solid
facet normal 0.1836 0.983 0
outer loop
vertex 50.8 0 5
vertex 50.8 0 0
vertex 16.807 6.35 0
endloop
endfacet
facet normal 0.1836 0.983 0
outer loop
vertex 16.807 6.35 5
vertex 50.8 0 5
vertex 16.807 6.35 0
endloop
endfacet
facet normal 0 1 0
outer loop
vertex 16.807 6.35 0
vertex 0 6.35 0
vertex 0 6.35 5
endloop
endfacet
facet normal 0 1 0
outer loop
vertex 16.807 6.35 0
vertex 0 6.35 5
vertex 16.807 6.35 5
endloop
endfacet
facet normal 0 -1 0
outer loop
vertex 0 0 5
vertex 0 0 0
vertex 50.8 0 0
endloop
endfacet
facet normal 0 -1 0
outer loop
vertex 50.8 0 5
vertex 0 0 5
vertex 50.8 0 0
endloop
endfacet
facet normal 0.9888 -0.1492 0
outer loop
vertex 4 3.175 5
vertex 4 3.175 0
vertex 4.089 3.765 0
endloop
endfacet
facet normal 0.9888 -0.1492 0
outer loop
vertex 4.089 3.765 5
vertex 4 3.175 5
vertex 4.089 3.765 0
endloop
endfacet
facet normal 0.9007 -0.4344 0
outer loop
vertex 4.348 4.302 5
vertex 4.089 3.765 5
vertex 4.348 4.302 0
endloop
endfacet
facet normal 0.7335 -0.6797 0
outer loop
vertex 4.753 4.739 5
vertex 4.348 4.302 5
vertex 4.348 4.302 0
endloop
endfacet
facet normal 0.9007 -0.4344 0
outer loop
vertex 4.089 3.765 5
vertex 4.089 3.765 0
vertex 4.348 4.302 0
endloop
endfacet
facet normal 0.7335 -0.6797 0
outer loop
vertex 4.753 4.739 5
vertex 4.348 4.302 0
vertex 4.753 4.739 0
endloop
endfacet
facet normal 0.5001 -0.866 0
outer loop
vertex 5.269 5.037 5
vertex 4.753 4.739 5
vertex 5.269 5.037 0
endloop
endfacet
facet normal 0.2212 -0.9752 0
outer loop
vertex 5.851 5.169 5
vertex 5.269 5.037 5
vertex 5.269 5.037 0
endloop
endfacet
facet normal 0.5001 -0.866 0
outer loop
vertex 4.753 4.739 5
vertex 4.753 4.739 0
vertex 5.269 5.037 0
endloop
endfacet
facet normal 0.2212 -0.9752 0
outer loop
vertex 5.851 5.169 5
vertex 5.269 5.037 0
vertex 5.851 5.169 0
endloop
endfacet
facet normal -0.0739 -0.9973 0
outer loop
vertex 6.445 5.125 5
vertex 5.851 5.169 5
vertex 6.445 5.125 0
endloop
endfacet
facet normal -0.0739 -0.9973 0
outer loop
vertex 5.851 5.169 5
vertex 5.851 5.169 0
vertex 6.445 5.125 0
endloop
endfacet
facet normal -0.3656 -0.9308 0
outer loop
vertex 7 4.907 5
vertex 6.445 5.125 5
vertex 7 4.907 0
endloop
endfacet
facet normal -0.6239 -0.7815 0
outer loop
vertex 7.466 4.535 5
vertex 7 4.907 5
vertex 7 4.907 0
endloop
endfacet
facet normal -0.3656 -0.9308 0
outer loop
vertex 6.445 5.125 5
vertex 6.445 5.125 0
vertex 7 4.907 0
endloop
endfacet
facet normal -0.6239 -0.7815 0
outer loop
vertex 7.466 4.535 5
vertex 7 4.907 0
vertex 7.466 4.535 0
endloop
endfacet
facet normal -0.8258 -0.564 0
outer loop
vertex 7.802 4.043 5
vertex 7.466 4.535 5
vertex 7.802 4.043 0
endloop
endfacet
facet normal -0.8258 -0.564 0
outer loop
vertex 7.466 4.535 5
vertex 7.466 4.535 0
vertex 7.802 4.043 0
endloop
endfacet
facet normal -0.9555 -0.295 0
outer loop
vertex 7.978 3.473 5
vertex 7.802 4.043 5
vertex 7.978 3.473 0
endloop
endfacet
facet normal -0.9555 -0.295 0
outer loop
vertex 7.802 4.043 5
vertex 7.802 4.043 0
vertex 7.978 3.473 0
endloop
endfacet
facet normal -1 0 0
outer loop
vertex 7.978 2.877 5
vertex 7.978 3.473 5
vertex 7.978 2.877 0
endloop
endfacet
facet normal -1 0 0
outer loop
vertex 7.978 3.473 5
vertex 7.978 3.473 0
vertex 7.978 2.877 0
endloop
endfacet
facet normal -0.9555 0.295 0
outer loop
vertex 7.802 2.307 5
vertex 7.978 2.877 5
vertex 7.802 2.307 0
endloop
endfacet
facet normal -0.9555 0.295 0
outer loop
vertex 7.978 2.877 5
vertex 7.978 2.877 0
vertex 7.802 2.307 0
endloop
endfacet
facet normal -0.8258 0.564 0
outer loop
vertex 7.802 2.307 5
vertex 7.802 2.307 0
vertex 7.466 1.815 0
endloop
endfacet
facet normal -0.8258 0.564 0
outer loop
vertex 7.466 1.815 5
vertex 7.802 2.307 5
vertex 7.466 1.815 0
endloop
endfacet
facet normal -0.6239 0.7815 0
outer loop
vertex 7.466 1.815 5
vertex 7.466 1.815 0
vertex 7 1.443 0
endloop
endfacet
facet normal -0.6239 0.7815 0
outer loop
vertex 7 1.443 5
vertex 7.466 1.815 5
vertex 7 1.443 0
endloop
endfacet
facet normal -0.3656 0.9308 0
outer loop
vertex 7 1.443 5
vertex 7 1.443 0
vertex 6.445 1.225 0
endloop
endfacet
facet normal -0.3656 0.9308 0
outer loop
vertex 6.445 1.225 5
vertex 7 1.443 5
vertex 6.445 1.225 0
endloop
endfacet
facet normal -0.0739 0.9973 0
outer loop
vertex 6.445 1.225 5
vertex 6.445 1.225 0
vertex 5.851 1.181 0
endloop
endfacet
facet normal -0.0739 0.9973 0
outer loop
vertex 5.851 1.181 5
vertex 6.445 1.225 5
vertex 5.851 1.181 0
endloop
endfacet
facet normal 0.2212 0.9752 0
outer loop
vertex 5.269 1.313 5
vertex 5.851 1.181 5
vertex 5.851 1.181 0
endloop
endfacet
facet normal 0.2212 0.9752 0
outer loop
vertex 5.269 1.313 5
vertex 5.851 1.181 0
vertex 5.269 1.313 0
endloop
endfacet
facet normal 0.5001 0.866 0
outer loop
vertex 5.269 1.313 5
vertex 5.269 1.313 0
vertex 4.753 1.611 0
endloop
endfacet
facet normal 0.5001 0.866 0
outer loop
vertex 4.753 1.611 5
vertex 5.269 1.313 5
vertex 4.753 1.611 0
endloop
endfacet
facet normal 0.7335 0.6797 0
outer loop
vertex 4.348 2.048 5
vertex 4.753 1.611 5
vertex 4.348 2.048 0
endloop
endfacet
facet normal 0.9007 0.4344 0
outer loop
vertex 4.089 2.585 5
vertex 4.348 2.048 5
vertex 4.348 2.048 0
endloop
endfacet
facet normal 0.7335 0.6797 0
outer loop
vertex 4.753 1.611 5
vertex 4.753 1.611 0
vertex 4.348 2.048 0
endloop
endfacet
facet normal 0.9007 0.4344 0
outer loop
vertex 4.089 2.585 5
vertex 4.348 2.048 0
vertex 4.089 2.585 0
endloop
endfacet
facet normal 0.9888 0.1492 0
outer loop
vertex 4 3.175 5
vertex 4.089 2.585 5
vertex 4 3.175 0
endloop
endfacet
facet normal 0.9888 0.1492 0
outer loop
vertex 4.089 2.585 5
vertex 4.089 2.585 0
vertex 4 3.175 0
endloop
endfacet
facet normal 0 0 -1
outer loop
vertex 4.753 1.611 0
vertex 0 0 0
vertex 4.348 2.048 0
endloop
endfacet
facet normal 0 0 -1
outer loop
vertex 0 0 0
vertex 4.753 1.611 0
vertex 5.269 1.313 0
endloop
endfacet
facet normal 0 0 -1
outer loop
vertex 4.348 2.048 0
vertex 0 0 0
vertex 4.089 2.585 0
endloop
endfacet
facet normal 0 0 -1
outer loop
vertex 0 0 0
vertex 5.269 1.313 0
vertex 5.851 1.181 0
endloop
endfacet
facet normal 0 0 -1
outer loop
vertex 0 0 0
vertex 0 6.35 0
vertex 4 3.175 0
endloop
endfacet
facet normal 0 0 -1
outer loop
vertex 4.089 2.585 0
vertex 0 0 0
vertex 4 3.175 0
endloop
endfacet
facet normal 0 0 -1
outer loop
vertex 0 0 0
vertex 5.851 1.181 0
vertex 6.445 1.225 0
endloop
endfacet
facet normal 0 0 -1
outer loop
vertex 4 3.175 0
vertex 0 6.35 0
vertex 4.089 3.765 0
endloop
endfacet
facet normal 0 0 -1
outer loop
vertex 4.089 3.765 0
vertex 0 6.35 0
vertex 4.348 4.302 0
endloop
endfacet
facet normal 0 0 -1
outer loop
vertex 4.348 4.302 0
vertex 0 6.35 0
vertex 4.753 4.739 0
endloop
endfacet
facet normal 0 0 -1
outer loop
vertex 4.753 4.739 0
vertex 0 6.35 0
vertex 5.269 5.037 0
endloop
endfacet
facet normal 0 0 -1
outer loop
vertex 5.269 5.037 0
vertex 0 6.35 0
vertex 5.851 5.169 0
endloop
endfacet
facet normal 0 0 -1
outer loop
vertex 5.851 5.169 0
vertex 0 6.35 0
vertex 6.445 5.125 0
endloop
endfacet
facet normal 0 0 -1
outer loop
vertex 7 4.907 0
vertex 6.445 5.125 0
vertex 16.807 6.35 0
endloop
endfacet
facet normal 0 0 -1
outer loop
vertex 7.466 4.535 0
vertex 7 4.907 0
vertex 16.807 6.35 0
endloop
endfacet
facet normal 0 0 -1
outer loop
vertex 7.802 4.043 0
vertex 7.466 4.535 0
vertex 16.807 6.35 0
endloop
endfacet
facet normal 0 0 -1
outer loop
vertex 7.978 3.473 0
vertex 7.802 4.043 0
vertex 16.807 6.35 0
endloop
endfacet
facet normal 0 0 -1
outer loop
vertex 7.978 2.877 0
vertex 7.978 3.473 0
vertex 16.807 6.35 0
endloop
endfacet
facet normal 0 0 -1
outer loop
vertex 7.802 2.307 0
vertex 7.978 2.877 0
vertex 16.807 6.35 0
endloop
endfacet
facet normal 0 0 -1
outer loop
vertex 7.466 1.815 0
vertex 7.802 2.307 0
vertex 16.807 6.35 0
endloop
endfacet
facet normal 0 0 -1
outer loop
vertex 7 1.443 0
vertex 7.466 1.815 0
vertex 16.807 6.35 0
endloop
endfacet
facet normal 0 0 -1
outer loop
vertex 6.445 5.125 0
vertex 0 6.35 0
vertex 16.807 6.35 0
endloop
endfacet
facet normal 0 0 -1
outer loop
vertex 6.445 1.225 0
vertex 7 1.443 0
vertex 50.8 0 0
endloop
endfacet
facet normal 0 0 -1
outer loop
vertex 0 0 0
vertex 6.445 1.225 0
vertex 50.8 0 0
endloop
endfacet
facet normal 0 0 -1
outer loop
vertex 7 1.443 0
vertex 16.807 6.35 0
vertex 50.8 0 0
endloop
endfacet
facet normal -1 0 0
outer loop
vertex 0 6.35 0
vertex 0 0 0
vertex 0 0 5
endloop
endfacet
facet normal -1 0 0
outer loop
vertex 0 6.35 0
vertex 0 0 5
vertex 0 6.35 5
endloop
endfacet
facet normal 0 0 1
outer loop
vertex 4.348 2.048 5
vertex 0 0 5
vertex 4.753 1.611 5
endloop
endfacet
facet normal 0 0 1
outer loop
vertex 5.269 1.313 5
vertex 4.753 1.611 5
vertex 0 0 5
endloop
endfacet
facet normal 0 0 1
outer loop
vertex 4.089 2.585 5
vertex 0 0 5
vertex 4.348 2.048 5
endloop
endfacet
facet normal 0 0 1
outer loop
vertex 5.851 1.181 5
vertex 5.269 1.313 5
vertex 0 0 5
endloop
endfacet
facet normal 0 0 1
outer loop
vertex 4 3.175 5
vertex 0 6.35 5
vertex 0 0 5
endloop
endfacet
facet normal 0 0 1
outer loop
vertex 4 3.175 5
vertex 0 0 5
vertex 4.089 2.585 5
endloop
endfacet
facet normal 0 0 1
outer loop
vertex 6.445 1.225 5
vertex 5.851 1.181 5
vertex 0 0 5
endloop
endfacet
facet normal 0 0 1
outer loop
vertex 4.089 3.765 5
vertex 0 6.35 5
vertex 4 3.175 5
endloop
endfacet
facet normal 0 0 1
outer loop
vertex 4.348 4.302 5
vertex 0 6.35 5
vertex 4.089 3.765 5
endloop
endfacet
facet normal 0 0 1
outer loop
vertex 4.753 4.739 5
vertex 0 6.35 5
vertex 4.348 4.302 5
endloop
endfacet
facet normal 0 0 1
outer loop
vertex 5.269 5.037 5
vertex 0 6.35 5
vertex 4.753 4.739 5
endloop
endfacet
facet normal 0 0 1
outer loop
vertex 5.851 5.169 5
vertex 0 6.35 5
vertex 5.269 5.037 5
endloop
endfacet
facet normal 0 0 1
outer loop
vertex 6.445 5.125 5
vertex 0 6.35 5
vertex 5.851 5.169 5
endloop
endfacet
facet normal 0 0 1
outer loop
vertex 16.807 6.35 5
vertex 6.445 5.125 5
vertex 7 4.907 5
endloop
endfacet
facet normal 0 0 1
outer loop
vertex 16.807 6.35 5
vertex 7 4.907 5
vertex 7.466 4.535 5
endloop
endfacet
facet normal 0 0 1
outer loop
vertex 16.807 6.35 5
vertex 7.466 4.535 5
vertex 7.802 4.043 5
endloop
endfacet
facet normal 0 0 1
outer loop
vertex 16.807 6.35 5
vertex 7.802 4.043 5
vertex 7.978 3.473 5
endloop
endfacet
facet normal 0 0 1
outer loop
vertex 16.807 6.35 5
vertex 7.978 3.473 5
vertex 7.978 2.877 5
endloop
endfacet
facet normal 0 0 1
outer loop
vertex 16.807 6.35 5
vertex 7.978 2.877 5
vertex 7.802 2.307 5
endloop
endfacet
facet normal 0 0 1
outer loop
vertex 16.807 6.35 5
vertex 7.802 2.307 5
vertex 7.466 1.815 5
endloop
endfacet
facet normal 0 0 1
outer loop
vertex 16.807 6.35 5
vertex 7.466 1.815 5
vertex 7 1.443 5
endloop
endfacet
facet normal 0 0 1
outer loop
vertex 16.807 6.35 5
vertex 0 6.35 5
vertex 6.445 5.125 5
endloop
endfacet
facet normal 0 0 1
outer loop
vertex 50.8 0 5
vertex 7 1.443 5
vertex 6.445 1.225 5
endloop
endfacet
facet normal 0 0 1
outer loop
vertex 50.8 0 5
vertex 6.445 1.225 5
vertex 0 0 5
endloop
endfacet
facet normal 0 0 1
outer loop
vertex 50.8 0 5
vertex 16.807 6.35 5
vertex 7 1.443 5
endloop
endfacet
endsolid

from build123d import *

# Parameters (mm, degrees)
SKETCH1_W           = 50.8
SKETCH1_H           = 6.35
BOSS_EXTRUDE1_DEPTH = 5
SKETCH2_R           = 2
CUT_EXTRUDE1_DEPTH  = 5
CUT_EXTRUDE2_DEPTH  = 5


with BuildPart() as part:
    # Sketch1 → Boss-Extrude1 (new body)
    with BuildSketch(Plane.XY):
        with Locations((25.4, 3.175)):
            Rectangle(SKETCH1_W, SKETCH1_H)
    extrude(amount=BOSS_EXTRUDE1_DEPTH)

    # Sketch2 → Cut-Extrude1 (cut)
    with BuildSketch(Plane(origin=(0, 0, 0), x_dir=(-1, 0, 0), z_dir=(0, 0, -1))):
        with Locations((-6, 3.175)):
            Circle(SKETCH2_R)
    extrude(amount=-CUT_EXTRUDE1_DEPTH, mode=Mode.SUBTRACT)

    # Sketch3 → Cut-Extrude2 (cut)
    with BuildSketch(Plane(origin=(0, 0, 0), x_dir=(-1, 0, 0), z_dir=(0, 0, -1))):
        Polygon((-50.8, 0), (-16.807033998, 6.35), (-50.8, 6.35), align=None)
    extrude(amount=-CUT_EXTRUDE2_DEPTH, mode=Mode.SUBTRACT)


solid = part.part
